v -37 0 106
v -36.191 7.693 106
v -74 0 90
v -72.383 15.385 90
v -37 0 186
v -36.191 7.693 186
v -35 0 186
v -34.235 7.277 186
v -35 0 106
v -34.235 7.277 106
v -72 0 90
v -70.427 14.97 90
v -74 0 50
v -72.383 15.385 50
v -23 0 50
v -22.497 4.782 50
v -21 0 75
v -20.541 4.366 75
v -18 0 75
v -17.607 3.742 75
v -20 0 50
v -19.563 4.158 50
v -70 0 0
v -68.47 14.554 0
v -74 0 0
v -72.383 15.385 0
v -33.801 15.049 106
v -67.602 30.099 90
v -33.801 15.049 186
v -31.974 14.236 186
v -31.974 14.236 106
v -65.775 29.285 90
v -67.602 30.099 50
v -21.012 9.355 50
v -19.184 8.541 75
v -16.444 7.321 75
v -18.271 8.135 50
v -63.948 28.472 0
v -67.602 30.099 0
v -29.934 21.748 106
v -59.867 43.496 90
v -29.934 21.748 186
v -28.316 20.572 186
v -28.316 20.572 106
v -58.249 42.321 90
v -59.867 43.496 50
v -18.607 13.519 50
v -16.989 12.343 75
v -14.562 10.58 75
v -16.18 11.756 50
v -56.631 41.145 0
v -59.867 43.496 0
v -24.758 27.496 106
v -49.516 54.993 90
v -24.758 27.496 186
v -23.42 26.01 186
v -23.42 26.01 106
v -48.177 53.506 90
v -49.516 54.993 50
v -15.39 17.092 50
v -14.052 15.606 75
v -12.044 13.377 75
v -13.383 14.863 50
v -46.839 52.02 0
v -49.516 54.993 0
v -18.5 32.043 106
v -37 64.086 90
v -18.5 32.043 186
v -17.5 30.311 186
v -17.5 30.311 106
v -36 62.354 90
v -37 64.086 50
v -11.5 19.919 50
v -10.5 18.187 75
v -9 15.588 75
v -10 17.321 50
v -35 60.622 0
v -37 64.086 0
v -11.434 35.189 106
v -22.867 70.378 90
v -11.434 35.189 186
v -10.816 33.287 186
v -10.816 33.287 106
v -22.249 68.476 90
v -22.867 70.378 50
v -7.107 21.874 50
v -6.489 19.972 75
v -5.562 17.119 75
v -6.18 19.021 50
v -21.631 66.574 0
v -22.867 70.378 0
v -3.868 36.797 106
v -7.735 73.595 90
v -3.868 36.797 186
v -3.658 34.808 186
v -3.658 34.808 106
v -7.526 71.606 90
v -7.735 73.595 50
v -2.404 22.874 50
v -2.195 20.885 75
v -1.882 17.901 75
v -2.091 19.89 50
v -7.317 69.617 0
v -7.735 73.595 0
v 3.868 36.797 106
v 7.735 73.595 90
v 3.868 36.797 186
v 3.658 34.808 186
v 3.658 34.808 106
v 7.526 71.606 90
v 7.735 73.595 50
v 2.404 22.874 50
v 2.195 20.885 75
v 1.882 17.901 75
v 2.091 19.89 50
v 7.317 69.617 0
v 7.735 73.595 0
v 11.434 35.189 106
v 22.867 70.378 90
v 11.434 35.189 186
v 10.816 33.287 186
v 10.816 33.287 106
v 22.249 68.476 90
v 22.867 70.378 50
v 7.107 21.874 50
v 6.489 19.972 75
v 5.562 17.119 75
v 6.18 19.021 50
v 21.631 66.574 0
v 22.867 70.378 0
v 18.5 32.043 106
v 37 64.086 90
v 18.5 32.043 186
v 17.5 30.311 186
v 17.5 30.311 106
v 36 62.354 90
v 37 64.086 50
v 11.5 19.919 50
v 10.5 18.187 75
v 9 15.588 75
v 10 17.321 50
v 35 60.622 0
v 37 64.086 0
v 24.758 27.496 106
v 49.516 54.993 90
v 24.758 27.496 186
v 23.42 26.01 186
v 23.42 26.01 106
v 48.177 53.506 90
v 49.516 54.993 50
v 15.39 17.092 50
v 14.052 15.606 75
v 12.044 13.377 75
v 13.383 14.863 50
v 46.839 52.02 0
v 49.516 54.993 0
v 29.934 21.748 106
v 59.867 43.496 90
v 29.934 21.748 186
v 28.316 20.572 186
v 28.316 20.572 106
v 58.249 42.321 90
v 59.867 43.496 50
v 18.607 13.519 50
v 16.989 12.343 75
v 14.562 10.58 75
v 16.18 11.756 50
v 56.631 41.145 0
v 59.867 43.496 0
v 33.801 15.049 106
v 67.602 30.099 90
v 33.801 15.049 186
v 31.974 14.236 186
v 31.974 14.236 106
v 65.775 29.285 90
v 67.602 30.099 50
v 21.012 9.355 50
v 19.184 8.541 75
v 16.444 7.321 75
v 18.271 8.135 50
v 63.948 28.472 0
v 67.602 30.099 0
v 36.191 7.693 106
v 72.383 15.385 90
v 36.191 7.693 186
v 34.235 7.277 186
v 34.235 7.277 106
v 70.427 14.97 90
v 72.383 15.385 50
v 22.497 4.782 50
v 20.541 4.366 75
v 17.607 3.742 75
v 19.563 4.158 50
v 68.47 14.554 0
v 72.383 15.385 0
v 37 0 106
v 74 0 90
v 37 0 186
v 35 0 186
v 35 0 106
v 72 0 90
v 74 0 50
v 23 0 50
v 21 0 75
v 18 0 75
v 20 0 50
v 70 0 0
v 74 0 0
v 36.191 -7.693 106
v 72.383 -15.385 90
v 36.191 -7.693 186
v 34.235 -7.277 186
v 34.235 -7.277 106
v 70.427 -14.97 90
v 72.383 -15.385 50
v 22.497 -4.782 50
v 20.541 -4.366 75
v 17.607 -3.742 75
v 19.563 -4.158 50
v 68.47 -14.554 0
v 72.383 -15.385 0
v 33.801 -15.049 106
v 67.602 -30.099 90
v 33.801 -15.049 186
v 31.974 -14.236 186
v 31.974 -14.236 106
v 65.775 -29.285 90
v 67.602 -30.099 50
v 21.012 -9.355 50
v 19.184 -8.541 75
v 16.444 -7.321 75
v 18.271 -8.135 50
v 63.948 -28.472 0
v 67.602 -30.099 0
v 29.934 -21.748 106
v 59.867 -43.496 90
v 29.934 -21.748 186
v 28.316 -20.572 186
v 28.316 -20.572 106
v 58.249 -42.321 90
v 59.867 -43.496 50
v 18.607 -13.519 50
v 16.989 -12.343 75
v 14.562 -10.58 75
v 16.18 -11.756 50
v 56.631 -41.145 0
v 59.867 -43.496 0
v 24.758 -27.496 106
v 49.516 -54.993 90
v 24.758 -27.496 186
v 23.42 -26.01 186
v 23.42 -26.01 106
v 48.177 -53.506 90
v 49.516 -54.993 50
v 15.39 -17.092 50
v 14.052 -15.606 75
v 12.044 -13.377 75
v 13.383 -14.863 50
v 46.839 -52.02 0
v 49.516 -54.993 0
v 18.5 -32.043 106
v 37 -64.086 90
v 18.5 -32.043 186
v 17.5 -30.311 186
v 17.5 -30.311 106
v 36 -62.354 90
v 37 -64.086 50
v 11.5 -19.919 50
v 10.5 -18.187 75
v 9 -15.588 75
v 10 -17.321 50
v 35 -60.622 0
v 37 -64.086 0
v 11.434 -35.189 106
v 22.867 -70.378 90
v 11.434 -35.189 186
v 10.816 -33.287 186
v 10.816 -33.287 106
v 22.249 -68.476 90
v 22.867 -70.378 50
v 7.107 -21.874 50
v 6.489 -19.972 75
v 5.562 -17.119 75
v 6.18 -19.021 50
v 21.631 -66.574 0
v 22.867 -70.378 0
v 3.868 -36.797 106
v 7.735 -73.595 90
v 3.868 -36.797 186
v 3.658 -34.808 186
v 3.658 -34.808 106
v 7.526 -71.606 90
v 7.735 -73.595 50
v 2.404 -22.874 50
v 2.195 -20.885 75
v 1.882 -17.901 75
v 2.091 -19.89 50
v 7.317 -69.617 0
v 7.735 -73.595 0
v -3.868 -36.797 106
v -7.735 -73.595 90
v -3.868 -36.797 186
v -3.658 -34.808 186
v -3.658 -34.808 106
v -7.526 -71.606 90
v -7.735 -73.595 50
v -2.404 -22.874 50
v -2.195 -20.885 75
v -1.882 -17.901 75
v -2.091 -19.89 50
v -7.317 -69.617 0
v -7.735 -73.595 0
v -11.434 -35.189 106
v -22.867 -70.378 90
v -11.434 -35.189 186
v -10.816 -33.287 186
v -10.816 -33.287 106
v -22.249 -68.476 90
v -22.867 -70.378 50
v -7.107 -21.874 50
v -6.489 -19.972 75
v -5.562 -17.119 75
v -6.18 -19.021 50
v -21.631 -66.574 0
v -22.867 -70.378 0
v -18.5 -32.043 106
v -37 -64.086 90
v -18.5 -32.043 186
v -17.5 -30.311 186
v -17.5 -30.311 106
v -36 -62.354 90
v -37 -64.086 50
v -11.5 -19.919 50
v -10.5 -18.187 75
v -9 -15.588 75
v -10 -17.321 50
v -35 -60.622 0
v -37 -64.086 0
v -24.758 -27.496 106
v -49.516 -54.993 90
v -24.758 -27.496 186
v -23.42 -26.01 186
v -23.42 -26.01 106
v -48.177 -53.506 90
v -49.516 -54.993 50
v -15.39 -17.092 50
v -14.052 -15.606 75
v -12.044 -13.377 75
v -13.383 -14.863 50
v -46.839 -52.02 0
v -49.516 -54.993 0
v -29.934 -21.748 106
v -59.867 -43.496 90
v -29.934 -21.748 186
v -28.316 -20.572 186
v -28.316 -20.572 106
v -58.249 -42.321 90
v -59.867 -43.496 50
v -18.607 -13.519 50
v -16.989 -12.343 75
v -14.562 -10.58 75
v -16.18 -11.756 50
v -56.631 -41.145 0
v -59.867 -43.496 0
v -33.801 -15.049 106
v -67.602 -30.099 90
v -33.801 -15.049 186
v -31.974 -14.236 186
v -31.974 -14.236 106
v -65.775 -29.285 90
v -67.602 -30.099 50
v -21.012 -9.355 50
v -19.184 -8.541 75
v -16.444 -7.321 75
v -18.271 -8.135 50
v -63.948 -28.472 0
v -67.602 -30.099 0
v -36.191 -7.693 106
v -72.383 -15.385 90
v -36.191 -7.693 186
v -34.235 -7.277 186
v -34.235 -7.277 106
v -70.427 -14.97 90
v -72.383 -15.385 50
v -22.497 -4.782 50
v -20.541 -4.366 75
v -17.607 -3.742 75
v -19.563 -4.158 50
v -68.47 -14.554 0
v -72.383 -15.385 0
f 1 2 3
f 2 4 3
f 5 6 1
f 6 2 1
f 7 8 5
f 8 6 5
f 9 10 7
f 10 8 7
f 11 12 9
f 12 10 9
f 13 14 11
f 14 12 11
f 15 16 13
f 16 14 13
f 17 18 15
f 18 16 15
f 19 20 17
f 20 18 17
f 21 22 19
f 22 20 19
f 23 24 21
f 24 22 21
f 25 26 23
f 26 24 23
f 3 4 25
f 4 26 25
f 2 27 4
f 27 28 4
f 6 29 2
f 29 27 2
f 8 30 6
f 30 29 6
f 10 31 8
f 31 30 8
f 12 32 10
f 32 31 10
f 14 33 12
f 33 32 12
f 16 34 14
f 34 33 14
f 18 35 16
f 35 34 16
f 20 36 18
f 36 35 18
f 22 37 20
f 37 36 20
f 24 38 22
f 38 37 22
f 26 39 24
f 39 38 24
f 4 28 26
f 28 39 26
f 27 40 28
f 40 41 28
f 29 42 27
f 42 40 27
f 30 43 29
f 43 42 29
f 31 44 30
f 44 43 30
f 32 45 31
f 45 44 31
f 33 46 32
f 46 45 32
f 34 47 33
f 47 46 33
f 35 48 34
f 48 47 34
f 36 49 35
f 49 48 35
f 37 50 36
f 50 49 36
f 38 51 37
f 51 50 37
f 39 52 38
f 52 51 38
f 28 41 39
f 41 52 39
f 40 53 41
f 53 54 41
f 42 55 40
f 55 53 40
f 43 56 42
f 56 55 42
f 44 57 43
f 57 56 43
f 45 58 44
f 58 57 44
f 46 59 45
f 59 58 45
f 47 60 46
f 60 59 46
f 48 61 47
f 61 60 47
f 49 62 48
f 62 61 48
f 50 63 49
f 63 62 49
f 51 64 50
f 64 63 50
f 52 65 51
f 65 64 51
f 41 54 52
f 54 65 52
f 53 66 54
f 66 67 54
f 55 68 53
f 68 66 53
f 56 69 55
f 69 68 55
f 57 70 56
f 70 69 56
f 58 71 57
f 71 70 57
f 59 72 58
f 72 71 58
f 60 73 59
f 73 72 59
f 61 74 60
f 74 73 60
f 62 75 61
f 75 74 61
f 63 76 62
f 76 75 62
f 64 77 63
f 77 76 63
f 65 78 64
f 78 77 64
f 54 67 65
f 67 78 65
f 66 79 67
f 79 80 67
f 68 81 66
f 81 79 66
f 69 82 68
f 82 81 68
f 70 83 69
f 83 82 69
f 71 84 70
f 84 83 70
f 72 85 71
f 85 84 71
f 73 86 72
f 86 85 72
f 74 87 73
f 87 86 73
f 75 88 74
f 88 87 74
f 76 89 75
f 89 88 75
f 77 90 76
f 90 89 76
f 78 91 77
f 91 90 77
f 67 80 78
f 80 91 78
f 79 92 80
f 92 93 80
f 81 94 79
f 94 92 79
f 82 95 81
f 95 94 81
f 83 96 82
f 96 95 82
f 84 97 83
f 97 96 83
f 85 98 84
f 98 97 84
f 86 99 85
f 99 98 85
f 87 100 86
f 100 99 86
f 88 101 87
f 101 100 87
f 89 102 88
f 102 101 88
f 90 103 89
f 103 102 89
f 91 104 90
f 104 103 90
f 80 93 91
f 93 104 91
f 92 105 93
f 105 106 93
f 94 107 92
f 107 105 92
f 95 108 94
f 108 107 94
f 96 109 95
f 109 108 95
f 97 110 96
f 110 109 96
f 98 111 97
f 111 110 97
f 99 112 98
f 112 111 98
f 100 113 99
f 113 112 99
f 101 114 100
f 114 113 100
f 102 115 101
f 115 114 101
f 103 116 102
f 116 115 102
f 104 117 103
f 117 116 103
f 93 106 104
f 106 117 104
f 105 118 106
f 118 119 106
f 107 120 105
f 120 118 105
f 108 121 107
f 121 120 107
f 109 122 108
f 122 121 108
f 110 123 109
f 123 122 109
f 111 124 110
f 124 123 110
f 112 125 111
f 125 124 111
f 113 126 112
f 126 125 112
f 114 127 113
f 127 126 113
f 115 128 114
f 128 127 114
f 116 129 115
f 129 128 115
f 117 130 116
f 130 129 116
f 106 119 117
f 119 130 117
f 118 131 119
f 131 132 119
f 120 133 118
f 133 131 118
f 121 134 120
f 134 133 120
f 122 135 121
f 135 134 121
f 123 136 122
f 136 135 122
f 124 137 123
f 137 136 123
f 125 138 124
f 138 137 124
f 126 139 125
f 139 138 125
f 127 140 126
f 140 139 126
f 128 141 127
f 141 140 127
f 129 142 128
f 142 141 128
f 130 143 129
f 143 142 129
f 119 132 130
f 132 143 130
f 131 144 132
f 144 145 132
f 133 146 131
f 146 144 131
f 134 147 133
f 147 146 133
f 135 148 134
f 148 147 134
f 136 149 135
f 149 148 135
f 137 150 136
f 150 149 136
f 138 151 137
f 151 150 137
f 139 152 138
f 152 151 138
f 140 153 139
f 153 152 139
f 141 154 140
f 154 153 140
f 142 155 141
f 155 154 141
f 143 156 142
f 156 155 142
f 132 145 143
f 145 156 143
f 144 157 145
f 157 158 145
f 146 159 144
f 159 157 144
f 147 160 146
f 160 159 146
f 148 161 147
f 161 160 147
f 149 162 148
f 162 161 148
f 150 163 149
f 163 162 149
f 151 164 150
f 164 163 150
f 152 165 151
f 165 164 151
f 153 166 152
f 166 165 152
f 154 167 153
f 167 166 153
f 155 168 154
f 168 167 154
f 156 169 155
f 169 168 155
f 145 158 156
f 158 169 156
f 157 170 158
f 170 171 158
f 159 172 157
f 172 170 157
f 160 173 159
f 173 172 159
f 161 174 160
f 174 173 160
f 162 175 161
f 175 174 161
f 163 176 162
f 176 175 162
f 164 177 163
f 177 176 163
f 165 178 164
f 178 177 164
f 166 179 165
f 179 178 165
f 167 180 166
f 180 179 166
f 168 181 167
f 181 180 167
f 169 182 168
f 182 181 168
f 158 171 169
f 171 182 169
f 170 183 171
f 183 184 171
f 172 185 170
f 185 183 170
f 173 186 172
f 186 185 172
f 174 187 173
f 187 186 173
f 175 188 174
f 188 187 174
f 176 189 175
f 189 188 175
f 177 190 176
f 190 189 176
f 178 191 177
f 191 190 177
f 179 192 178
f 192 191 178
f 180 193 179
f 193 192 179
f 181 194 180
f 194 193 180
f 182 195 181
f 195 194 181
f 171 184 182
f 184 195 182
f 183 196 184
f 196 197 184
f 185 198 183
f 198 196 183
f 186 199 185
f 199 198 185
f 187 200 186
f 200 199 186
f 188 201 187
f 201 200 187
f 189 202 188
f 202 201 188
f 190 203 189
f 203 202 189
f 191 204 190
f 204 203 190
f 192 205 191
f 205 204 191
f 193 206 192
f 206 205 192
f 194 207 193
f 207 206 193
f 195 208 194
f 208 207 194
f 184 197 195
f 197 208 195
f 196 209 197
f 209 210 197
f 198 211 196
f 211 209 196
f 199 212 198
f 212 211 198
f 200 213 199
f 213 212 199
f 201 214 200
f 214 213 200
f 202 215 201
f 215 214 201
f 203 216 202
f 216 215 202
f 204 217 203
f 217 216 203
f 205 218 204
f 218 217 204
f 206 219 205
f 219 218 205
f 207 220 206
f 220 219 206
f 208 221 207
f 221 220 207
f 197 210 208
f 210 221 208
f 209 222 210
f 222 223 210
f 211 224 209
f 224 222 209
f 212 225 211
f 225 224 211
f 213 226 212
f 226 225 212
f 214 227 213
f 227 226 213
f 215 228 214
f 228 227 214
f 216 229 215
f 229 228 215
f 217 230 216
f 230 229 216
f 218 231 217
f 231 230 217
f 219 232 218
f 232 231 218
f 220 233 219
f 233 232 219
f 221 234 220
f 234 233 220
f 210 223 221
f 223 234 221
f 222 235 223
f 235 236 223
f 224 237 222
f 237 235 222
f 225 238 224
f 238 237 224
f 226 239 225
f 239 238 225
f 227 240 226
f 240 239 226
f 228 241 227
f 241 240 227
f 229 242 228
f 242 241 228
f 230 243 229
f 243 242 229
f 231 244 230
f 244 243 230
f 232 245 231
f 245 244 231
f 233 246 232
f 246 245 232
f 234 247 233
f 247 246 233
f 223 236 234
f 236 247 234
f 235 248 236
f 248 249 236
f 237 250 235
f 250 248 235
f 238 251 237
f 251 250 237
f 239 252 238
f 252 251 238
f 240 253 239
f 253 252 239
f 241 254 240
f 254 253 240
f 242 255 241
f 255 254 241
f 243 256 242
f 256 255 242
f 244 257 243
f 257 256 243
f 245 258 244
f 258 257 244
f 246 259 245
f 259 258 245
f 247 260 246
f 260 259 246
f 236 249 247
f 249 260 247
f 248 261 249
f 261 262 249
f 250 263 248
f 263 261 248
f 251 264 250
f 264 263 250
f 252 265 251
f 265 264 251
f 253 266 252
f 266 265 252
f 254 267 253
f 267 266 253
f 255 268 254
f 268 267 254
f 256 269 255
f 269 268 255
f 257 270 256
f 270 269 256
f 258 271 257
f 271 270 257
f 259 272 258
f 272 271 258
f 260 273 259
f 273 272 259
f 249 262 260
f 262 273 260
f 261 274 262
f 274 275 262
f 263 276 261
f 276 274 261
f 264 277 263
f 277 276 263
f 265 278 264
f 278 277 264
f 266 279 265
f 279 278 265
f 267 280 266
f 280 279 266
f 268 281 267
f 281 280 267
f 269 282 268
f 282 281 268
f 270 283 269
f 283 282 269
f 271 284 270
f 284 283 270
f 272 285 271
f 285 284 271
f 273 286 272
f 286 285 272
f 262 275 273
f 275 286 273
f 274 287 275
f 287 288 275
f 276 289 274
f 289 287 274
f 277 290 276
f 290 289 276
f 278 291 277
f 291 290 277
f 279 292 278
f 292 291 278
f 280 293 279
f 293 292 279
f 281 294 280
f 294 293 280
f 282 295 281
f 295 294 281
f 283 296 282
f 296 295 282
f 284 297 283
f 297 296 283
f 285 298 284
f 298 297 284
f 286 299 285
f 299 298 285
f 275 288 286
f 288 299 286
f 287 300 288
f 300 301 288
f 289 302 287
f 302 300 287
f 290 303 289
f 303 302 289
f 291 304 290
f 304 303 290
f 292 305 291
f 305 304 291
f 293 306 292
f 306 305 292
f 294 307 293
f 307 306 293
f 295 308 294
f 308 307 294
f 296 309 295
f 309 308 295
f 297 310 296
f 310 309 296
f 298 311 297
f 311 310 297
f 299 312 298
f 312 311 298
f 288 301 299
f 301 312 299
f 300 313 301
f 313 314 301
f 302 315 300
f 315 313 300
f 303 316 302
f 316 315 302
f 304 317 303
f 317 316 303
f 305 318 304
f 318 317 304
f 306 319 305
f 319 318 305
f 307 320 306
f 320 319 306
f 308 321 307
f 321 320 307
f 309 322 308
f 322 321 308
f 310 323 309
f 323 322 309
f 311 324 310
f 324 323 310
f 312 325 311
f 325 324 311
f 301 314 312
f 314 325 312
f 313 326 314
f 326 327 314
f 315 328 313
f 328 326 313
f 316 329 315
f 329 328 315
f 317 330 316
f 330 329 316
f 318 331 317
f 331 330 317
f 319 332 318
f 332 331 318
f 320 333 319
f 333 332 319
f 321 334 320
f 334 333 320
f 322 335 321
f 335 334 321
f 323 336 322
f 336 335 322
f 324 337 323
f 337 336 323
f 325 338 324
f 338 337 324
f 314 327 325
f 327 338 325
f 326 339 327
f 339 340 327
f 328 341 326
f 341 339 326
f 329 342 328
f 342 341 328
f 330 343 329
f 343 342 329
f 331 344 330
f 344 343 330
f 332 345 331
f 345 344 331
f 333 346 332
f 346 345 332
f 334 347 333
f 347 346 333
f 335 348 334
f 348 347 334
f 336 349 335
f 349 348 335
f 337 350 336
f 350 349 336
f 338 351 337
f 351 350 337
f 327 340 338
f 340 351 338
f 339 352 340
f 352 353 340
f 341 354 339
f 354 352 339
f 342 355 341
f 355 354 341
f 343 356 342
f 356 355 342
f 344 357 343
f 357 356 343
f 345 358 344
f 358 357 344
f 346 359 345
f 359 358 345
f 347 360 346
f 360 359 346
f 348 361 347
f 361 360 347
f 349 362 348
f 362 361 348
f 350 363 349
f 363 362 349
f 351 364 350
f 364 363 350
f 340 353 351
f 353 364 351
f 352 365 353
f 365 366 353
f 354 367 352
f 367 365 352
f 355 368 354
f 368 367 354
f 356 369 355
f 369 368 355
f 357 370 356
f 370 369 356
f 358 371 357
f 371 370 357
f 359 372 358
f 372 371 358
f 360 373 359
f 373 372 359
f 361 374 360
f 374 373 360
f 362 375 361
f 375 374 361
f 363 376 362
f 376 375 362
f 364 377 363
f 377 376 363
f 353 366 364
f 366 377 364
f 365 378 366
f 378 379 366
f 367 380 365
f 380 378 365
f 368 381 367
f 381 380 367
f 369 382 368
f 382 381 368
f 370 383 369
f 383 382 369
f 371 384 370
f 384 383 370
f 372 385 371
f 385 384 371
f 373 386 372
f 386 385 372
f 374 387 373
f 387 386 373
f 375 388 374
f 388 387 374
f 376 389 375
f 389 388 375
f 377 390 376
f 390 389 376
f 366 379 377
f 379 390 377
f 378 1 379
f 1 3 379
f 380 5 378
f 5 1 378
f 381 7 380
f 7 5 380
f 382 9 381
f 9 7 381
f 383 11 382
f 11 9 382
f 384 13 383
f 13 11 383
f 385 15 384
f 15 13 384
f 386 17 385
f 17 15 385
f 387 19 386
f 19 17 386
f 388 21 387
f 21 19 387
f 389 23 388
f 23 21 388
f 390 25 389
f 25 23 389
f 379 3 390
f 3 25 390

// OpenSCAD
/* Funnel for filling kombucha bottles
*  File: komfun.scad
 * Author: deh
 * Latest edit: 201702121118
*/

// Thicknesses
lip = 4;
t1 = 3;
t2 = 2;

// radiuses
r1 = 70;
r2 = 20;
r3 = 18;
r4 = r1+lip-t2;
r5 = 35;

// Lengths
l1 = 50;
l2 = 25;
l3 = 40;
l4 = 16;
l5 = 80;

// Polygon points for cross-section
x1  = r1;	y1  = 0;
x2  = r2;	y2  = l1;
x3  = r3;	y3  = l1+l2;
x4  = r3+t1;	y4  = l1+l2;
x5  = r2+t1;	y5  = l1;
x6  = r1+lip;	y6  = l1;
x7  = r4;	y7  = l1+l3;
x8  = r5;	y8  = l1+l3+l4;
x9  = r5;	y9  = l1+l3+l4+l5;
x10 = r5+t2;	y10 = l1+l3+l4+l5;
x11 = r5+t2;	y11 = l1+l3+l4;
x12 = r4+t2;	y12 = l1+l3;
x13 = r1+lip;	y13 = 0;

module shell()
{
  rotate_extrude(angle=360,convexity=10)
  {
   polygon(points = [
     [x1,y1], [x2,y2], [x3,y3], [x4,y4],
     [x5,y5], [x6,y6], [x7,y7], [x8,y8], [x9,y9], 
     [x10,y10], [x11,y11], 
     [x12,y12], [x13,y13] ]);
  }
}

shell();
